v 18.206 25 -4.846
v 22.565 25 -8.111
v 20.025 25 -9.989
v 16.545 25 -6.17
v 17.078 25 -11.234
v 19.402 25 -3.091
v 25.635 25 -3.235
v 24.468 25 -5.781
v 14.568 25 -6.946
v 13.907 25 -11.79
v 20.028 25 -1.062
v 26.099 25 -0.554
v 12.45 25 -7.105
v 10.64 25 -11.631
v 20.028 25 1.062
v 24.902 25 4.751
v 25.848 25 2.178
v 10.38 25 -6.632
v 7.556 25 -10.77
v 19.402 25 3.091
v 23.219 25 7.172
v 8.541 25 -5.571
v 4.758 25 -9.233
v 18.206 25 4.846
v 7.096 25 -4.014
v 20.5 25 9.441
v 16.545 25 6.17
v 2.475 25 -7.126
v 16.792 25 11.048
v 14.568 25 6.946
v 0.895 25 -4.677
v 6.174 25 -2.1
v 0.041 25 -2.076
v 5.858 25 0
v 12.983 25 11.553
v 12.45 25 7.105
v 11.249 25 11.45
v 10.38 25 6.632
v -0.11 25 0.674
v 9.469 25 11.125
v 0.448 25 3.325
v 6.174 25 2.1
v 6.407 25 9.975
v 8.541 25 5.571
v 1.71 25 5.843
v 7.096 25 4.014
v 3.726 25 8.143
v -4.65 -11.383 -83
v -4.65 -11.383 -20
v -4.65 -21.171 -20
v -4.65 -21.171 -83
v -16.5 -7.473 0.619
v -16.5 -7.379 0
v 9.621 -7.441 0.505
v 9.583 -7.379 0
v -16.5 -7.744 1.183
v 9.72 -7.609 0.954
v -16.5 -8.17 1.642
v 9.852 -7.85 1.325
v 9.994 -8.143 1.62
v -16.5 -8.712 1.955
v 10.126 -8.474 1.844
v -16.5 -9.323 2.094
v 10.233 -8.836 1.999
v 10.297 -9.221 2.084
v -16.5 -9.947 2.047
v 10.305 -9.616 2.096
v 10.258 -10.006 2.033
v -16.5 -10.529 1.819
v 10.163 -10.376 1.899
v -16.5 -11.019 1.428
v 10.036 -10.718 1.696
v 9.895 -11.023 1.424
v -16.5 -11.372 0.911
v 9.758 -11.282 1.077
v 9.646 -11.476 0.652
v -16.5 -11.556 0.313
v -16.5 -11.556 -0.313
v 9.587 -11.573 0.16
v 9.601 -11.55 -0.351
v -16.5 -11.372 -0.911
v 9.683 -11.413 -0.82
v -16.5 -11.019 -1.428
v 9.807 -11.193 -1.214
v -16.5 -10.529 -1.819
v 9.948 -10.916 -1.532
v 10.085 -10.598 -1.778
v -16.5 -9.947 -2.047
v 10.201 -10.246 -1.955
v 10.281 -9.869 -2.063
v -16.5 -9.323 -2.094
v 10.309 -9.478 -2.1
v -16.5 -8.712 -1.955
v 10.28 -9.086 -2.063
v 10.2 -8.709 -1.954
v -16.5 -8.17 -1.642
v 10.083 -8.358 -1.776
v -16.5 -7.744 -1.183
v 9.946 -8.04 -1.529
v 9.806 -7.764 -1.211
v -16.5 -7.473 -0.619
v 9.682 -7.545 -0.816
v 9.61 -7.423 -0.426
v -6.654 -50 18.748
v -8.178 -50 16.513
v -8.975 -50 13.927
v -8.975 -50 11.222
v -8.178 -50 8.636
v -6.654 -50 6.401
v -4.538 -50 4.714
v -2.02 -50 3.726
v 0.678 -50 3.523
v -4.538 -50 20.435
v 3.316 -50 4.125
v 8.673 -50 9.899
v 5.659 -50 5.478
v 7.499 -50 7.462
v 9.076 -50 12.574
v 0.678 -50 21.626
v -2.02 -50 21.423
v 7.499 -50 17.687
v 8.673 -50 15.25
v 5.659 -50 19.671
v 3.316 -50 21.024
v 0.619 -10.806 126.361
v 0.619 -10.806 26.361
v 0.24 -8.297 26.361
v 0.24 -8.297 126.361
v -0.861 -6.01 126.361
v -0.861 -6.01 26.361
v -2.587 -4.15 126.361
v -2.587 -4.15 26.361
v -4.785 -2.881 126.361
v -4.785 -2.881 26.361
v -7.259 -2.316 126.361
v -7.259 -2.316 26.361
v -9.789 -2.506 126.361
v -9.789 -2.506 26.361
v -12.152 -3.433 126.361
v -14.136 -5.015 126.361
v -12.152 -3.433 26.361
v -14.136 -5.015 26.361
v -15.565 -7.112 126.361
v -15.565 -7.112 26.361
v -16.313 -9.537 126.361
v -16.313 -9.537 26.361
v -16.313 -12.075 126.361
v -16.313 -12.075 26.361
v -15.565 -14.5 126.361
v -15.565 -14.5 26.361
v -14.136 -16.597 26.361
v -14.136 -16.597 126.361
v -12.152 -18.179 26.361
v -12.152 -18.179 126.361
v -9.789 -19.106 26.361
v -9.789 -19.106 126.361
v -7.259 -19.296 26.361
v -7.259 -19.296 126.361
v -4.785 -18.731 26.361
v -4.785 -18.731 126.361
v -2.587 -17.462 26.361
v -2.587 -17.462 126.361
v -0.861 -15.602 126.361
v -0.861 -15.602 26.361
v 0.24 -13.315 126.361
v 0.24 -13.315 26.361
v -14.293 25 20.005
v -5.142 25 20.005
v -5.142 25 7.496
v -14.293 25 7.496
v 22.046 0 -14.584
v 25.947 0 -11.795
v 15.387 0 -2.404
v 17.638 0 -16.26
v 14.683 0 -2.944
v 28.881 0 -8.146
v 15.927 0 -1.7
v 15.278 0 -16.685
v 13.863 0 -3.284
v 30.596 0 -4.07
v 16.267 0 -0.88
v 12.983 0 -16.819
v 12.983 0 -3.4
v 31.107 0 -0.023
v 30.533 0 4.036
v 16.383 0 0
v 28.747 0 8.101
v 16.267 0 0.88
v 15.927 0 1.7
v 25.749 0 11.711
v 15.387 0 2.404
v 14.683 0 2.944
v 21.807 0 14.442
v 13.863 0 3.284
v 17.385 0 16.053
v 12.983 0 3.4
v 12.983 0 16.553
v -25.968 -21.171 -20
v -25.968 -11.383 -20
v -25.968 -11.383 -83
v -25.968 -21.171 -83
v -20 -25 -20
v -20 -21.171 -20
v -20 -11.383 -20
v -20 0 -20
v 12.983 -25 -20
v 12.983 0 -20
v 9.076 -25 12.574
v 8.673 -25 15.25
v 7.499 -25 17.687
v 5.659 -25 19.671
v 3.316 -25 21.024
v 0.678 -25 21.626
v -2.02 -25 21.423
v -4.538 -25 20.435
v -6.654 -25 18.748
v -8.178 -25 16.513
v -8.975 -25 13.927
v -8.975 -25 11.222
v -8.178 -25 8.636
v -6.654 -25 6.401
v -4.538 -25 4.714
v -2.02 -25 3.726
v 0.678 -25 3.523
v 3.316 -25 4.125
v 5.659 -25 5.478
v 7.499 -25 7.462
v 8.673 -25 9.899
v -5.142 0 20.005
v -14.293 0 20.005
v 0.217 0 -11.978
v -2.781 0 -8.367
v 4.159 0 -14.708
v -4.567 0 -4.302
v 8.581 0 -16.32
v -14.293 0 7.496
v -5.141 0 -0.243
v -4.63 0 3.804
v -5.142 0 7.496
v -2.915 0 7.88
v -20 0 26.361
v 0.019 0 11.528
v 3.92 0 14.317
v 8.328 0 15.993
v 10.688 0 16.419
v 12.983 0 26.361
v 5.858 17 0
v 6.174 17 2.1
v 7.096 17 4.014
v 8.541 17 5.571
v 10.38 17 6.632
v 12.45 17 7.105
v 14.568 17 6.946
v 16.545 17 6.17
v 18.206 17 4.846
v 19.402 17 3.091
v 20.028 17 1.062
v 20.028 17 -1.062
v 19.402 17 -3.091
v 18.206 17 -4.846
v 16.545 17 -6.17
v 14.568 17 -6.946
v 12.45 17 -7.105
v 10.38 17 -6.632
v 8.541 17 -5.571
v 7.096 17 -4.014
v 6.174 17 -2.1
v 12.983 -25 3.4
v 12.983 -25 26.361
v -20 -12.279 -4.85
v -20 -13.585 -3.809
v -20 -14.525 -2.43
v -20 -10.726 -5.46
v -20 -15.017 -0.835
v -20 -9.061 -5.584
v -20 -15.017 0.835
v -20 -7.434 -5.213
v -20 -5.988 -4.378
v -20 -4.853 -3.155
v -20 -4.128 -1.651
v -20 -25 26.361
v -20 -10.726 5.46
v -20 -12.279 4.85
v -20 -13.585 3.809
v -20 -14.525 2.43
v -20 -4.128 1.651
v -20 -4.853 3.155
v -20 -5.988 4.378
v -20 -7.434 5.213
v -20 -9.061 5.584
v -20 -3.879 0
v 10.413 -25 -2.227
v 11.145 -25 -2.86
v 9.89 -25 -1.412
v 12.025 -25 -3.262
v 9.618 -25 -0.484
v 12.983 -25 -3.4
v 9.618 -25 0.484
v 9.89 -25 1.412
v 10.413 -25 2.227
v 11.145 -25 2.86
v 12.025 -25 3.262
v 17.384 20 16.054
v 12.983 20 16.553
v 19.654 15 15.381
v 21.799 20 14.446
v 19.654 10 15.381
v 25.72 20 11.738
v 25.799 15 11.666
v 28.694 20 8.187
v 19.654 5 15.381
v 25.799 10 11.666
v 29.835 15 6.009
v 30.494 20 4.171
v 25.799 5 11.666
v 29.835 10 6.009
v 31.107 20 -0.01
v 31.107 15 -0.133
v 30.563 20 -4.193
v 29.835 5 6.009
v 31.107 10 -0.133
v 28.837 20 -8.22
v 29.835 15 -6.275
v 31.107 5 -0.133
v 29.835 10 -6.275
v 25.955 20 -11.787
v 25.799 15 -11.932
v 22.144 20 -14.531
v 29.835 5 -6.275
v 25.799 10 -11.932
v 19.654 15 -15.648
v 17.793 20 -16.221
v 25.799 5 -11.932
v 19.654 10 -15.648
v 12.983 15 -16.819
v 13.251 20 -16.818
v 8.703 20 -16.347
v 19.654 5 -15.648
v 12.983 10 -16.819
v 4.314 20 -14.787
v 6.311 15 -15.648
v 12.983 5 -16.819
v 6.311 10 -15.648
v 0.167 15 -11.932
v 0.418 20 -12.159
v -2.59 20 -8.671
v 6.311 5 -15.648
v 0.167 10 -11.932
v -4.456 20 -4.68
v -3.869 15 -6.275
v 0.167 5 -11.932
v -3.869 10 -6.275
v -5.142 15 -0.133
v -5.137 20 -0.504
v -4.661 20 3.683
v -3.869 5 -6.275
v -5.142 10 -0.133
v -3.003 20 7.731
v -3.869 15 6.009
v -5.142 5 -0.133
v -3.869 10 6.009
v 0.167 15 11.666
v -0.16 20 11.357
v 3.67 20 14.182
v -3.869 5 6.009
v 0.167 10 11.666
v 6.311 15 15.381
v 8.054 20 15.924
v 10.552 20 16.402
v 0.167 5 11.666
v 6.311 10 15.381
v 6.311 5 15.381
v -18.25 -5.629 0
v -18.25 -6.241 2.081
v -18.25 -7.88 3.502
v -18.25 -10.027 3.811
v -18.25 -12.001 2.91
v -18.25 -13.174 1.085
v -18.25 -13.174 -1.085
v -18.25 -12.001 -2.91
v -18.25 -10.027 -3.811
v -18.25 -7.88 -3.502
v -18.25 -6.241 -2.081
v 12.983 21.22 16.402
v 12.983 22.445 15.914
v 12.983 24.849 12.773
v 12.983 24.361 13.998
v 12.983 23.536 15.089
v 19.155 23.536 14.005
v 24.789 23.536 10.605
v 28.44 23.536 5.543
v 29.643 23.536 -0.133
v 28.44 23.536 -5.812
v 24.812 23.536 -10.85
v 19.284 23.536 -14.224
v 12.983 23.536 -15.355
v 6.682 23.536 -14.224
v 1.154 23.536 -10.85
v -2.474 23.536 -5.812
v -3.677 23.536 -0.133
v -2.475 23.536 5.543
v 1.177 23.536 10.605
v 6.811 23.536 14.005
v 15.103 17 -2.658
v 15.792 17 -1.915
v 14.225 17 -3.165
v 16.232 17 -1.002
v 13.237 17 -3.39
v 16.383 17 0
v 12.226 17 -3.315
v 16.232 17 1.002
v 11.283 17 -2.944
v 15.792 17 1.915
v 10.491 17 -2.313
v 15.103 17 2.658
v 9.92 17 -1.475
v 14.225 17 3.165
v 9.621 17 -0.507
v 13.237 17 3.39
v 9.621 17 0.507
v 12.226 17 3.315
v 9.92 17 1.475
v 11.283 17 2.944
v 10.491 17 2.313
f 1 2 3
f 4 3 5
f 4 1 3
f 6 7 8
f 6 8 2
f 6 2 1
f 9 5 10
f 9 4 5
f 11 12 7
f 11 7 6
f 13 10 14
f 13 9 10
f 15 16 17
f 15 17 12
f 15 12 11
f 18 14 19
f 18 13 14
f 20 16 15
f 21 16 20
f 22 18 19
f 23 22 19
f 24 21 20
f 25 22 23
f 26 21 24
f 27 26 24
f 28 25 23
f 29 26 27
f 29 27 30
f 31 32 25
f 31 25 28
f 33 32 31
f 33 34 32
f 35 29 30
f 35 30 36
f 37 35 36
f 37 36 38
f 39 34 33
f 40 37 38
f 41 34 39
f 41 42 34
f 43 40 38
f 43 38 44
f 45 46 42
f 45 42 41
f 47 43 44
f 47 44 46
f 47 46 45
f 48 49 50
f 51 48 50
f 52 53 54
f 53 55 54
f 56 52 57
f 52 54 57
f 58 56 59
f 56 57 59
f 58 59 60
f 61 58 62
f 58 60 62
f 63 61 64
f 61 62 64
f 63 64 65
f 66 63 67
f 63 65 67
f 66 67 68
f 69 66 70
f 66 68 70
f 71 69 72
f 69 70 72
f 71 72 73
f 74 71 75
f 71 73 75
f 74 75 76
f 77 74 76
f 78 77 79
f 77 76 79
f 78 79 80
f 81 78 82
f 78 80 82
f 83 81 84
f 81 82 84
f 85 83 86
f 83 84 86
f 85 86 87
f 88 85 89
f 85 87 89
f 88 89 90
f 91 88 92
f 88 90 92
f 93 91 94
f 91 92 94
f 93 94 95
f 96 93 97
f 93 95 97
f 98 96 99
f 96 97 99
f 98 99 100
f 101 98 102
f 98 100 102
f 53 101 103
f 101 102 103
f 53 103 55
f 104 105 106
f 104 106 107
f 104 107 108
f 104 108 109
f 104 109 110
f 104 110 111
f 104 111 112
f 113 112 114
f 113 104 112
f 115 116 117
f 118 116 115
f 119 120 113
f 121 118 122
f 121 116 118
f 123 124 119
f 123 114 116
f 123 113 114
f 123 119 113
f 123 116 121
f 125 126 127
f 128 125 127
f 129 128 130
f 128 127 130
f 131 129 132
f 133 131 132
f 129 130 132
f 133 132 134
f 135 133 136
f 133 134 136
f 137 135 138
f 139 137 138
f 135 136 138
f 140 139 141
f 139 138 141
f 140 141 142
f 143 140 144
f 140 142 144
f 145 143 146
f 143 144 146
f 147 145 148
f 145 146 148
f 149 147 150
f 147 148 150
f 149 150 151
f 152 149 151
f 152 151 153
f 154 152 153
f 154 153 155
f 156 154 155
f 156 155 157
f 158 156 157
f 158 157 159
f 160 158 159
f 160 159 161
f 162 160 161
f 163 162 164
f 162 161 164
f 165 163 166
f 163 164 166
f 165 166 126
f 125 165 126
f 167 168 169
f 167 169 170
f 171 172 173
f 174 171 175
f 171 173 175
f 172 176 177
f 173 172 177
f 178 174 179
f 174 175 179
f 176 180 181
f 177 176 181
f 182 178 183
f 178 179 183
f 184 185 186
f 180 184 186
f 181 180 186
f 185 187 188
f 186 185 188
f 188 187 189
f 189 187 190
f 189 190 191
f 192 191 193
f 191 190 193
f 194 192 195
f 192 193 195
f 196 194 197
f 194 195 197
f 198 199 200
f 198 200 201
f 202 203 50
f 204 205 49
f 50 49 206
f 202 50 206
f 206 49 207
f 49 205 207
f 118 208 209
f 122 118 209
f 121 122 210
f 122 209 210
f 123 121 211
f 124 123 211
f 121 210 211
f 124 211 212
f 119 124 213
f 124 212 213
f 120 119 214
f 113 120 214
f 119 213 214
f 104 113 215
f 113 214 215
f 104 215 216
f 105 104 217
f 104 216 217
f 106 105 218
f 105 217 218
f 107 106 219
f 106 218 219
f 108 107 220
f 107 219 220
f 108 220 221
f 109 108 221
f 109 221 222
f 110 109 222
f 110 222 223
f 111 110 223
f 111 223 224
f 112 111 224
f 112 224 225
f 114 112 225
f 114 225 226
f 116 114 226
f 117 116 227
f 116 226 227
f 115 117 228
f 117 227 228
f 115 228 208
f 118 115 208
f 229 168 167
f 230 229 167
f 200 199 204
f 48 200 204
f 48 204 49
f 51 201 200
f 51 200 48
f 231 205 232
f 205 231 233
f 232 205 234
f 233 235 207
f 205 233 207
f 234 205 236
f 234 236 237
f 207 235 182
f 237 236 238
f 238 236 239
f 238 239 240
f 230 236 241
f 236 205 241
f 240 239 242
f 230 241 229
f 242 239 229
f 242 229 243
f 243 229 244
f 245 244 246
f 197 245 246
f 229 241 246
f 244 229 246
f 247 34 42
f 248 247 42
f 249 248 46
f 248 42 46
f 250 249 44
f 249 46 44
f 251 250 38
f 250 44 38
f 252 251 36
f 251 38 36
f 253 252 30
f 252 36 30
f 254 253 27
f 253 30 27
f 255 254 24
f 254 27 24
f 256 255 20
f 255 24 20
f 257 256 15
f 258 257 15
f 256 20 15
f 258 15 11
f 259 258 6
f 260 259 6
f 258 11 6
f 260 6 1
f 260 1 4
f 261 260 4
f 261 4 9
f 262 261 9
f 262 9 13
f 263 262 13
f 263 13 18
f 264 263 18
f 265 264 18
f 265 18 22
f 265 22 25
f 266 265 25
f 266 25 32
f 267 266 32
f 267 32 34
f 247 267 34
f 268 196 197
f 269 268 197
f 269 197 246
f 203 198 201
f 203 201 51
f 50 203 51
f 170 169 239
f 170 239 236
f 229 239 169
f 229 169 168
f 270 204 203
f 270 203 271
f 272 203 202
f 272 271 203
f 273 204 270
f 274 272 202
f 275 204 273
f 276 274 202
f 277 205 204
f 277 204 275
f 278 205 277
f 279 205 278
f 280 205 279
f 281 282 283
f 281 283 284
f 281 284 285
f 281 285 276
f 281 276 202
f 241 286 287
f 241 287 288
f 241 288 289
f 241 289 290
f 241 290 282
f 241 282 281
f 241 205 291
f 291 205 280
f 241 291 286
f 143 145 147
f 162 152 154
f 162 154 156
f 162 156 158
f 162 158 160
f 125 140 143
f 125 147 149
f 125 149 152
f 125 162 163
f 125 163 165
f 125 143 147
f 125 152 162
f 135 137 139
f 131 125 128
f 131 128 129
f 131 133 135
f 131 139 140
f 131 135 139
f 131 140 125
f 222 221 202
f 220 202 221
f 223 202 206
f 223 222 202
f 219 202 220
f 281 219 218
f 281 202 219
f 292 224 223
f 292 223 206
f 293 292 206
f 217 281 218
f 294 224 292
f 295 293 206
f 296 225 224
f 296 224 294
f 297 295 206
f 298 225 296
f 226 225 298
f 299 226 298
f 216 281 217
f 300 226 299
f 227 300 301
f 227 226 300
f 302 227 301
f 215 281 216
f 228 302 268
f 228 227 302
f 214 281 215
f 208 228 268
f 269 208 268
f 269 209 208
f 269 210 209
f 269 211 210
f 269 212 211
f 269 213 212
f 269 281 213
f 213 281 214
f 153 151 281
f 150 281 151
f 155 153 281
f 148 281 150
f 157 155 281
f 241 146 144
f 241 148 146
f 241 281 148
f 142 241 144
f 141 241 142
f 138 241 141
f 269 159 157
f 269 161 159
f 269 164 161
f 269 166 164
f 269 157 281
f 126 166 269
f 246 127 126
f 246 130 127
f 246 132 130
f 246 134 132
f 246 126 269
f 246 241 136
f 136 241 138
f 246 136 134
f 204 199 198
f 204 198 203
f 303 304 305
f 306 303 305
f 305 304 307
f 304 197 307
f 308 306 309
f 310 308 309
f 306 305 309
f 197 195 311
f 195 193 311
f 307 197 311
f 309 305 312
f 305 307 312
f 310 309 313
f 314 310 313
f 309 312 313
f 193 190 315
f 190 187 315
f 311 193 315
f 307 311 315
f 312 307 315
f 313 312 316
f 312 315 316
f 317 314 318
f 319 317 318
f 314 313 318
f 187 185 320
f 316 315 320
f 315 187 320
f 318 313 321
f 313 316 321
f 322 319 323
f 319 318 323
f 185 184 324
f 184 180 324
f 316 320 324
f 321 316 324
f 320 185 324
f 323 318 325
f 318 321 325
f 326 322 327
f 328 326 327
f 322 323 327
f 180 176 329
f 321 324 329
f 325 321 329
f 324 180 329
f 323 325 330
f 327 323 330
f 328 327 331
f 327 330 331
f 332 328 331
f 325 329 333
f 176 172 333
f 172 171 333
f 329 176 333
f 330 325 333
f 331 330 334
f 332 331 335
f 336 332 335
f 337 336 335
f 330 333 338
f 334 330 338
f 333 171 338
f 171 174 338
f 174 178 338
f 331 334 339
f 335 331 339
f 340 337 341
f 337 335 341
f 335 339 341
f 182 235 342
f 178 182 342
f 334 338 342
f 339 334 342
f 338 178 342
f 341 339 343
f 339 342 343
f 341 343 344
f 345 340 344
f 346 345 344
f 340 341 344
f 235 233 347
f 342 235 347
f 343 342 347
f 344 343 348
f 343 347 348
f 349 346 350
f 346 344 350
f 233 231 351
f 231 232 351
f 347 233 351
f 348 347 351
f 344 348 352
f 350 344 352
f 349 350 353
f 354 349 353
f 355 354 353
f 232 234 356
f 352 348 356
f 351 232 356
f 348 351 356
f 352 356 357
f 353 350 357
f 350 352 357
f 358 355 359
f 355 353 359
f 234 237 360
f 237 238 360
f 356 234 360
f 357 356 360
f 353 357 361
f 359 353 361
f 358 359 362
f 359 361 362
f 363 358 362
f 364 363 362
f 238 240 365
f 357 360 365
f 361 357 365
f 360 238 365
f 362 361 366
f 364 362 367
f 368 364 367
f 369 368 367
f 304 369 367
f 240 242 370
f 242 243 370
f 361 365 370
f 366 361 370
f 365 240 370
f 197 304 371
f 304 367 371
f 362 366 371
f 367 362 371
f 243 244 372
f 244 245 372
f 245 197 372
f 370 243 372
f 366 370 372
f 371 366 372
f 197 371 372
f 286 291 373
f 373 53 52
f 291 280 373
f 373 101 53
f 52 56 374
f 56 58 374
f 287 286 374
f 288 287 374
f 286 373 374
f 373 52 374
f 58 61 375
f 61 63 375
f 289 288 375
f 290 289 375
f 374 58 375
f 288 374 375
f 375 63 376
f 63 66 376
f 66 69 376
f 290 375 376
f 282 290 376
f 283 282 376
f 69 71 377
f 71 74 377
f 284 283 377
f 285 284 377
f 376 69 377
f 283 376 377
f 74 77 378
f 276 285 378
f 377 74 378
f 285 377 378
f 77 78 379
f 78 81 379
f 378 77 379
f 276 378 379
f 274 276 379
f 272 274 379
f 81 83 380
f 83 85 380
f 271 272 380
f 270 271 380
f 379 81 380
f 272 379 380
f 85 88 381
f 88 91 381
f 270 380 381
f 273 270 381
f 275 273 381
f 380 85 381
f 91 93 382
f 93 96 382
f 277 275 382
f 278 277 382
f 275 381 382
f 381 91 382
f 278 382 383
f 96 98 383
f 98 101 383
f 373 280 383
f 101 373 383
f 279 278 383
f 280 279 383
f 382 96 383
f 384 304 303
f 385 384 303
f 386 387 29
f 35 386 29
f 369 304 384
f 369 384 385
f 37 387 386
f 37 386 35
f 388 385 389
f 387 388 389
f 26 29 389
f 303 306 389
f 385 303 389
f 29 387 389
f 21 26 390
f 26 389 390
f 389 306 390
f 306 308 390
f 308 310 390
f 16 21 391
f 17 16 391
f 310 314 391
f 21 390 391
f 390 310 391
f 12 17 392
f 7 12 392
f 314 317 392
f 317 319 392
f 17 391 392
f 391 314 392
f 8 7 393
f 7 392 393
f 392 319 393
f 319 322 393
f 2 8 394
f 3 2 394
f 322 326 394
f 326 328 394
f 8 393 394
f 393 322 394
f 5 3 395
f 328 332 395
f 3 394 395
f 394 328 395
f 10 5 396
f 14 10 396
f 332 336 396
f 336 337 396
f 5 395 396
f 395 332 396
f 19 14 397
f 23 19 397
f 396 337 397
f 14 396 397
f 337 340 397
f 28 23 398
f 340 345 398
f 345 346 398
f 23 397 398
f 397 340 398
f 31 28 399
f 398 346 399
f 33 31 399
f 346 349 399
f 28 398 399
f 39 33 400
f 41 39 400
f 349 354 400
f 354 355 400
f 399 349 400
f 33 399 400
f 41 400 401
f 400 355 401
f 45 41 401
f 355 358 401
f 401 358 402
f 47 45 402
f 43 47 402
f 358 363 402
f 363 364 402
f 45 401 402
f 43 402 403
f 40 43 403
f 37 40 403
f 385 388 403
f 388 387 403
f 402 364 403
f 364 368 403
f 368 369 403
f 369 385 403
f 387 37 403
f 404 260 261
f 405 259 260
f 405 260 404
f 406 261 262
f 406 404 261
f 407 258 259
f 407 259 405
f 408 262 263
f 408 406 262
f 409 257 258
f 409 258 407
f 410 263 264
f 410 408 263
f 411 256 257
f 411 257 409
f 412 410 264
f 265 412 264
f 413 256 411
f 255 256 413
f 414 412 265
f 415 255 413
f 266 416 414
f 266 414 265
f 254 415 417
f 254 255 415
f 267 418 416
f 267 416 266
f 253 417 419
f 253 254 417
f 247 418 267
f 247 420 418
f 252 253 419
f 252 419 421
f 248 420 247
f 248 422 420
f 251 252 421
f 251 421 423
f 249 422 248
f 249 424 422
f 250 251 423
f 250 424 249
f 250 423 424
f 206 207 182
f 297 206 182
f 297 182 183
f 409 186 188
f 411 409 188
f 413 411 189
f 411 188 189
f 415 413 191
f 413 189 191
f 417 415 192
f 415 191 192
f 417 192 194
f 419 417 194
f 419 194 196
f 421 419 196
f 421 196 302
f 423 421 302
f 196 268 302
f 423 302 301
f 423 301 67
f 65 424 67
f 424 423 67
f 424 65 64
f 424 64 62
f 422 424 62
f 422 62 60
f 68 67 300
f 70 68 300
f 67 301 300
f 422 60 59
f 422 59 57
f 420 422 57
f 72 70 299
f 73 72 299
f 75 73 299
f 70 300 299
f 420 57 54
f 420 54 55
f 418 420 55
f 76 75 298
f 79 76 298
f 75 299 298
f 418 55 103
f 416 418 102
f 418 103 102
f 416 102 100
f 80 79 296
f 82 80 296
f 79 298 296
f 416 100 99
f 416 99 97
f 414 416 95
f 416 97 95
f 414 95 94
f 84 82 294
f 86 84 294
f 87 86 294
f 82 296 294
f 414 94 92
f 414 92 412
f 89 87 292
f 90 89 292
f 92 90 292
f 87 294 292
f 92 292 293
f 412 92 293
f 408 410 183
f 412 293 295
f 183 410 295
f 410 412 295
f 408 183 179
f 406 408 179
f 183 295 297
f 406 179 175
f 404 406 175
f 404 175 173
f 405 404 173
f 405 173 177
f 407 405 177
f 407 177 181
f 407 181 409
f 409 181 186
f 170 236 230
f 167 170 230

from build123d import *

# Parameters (mm, degrees)
F0_W           = 32.9829213189
F0_H           = 46.3607293487
F1_DEPTH       = 25
F2_R           = 9.0764857075
F3_DEPTH       = 25
F5_DEPTH       = 25
F7_D           = 6.8
F7_CBORE_D     = 14.25
F7_CBORE_DEPTH = 8
F9_D           = 4.2
F9_CSINK_D     = 11.2
F9_CSINK_ANGLE = 90
F10_R          = 8.5134685027
F11_DEPTH      = 100
F12_W          = 9.1509986669
F12_H          = 12.5092789531
F13_DEPTH      = 25
F14_W          = 21.3182359003
F14_H          = 9.7881210968
F15_DEPTH      = 63
F16_R          = 5


with BuildPart() as f1:
    # F0 (on Front) → F1 (new body)
    with BuildSketch(Plane.XZ):
        with Locations((-3.5085393405, 3.1803646744)):
            Rectangle(F0_W, F0_H)
    extrude(amount=F1_DEPTH)

    # F2 (on face) → F3 (join)
    with BuildSketch(Plane.XZ.offset(25)):
        with Locations((0, 12.5744864345)):
            Circle(F2_R)
    extrude(amount=F3_DEPTH)

    # F4 (on face) → F5 (join)
    with BuildSketch(Plane(origin=(0, 0, 0), x_dir=(-1, 0, 0), z_dir=(0, 1, 0))):
        with BuildLine():
            add(Edge.make_bspline(
                [(-12.9829213189, -16.8193947008), (5.1416382194, -16.8193947008), (5.1416382194, -0.1332014799)],
                knots=[4.7123889804, 4.7123889804, 4.7123889804, 6.2831853072, 6.2831853072, 6.2831853072], degree=2, weights=[1, 0.7071067812, 1]))
            add(Edge.make_bspline(
                [(5.1416382194, -0.1332014799), (5.1416382194, 16.552991741), (-12.9829213189, 16.552991741)],
                knots=[0, 0, 0, 1.5707963268, 1.5707963268, 1.5707963268], degree=2, weights=[1, 0.7071067812, 1]))
            Line((-12.9829213189, 16.552991741), (-12.9829213189, -16.8193947008))
        make_face()
        with BuildLine():
            Line((-12.9829213189, -16.8193947008), (-12.9829213189, 16.552991741))
            add(Edge.make_bspline(
                [(-12.9829213189, 16.552991741), (-31.1074808572, 16.552991741), (-31.1074808572, -0.1332014799), (-31.1074808572, -16.8193947008), (-12.9829213189, -16.8193947008)],
                knots=[1.5707963268, 1.5707963268, 1.5707963268, 3.1415926536, 3.1415926536, 4.7123889804, 4.7123889804, 4.7123889804], degree=2, weights=[1, 0.7071067812, 1, 0.7071067812, 1]))
        make_face()
    extrude(amount=F5_DEPTH)

    # F7 (through all)
    with Locations(Plane(origin=(0, 25, 0), x_dir=(-1, 0, 0), z_dir=(0, 1, 0))):
        with Locations((-12.9829213189, 0)):
            CounterBoreHole(F7_D / 2, F7_CBORE_D / 2, F7_CBORE_DEPTH)

    # F9 (through all)
    with Locations(Plane(origin=(-20, 0, 0), x_dir=(0, -1, 0), z_dir=(-1, 0, 0))):
        with Locations((9.4794901088, 0)):
            CounterSinkHole(F9_D / 2, F9_CSINK_D / 2, counter_sink_angle=F9_CSINK_ANGLE)

    # F10 (on face) → F11 (join)
    with BuildSketch(Plane.XY.offset(26.3607293487)):
        with Locations((-7.8948987648, -10.8059616759)):
            Circle(F10_R)
    extrude(amount=F11_DEPTH)

    # F12 (on face) → F13 (join)
    with BuildSketch(Plane(origin=(0, 0, 0), x_dir=(-1, 0, 0), z_dir=(0, 1, 0))):
        with Locations((9.7171375528, 13.7501917779)):
            Rectangle(F12_W, F12_H)
    extrude(amount=F13_DEPTH)

    # F14 (on face) → F15 (join)
    with BuildSketch(Plane(origin=(0, 0, -20), x_dir=(1, 0, 0), z_dir=(0, 0, -1))):
        with Locations((-15.3092734981, 16.2768163718)):
            Rectangle(F14_W, F14_H)
    extrude(amount=F15_DEPTH)

    # F16
    f16_edges = [f1.edges().sort_by_distance(p)[0] for p in [
        (31.107481, 25, -0.133201),
    ]]
    fillet(f16_edges, radius=F16_R)


solid = f1.part
